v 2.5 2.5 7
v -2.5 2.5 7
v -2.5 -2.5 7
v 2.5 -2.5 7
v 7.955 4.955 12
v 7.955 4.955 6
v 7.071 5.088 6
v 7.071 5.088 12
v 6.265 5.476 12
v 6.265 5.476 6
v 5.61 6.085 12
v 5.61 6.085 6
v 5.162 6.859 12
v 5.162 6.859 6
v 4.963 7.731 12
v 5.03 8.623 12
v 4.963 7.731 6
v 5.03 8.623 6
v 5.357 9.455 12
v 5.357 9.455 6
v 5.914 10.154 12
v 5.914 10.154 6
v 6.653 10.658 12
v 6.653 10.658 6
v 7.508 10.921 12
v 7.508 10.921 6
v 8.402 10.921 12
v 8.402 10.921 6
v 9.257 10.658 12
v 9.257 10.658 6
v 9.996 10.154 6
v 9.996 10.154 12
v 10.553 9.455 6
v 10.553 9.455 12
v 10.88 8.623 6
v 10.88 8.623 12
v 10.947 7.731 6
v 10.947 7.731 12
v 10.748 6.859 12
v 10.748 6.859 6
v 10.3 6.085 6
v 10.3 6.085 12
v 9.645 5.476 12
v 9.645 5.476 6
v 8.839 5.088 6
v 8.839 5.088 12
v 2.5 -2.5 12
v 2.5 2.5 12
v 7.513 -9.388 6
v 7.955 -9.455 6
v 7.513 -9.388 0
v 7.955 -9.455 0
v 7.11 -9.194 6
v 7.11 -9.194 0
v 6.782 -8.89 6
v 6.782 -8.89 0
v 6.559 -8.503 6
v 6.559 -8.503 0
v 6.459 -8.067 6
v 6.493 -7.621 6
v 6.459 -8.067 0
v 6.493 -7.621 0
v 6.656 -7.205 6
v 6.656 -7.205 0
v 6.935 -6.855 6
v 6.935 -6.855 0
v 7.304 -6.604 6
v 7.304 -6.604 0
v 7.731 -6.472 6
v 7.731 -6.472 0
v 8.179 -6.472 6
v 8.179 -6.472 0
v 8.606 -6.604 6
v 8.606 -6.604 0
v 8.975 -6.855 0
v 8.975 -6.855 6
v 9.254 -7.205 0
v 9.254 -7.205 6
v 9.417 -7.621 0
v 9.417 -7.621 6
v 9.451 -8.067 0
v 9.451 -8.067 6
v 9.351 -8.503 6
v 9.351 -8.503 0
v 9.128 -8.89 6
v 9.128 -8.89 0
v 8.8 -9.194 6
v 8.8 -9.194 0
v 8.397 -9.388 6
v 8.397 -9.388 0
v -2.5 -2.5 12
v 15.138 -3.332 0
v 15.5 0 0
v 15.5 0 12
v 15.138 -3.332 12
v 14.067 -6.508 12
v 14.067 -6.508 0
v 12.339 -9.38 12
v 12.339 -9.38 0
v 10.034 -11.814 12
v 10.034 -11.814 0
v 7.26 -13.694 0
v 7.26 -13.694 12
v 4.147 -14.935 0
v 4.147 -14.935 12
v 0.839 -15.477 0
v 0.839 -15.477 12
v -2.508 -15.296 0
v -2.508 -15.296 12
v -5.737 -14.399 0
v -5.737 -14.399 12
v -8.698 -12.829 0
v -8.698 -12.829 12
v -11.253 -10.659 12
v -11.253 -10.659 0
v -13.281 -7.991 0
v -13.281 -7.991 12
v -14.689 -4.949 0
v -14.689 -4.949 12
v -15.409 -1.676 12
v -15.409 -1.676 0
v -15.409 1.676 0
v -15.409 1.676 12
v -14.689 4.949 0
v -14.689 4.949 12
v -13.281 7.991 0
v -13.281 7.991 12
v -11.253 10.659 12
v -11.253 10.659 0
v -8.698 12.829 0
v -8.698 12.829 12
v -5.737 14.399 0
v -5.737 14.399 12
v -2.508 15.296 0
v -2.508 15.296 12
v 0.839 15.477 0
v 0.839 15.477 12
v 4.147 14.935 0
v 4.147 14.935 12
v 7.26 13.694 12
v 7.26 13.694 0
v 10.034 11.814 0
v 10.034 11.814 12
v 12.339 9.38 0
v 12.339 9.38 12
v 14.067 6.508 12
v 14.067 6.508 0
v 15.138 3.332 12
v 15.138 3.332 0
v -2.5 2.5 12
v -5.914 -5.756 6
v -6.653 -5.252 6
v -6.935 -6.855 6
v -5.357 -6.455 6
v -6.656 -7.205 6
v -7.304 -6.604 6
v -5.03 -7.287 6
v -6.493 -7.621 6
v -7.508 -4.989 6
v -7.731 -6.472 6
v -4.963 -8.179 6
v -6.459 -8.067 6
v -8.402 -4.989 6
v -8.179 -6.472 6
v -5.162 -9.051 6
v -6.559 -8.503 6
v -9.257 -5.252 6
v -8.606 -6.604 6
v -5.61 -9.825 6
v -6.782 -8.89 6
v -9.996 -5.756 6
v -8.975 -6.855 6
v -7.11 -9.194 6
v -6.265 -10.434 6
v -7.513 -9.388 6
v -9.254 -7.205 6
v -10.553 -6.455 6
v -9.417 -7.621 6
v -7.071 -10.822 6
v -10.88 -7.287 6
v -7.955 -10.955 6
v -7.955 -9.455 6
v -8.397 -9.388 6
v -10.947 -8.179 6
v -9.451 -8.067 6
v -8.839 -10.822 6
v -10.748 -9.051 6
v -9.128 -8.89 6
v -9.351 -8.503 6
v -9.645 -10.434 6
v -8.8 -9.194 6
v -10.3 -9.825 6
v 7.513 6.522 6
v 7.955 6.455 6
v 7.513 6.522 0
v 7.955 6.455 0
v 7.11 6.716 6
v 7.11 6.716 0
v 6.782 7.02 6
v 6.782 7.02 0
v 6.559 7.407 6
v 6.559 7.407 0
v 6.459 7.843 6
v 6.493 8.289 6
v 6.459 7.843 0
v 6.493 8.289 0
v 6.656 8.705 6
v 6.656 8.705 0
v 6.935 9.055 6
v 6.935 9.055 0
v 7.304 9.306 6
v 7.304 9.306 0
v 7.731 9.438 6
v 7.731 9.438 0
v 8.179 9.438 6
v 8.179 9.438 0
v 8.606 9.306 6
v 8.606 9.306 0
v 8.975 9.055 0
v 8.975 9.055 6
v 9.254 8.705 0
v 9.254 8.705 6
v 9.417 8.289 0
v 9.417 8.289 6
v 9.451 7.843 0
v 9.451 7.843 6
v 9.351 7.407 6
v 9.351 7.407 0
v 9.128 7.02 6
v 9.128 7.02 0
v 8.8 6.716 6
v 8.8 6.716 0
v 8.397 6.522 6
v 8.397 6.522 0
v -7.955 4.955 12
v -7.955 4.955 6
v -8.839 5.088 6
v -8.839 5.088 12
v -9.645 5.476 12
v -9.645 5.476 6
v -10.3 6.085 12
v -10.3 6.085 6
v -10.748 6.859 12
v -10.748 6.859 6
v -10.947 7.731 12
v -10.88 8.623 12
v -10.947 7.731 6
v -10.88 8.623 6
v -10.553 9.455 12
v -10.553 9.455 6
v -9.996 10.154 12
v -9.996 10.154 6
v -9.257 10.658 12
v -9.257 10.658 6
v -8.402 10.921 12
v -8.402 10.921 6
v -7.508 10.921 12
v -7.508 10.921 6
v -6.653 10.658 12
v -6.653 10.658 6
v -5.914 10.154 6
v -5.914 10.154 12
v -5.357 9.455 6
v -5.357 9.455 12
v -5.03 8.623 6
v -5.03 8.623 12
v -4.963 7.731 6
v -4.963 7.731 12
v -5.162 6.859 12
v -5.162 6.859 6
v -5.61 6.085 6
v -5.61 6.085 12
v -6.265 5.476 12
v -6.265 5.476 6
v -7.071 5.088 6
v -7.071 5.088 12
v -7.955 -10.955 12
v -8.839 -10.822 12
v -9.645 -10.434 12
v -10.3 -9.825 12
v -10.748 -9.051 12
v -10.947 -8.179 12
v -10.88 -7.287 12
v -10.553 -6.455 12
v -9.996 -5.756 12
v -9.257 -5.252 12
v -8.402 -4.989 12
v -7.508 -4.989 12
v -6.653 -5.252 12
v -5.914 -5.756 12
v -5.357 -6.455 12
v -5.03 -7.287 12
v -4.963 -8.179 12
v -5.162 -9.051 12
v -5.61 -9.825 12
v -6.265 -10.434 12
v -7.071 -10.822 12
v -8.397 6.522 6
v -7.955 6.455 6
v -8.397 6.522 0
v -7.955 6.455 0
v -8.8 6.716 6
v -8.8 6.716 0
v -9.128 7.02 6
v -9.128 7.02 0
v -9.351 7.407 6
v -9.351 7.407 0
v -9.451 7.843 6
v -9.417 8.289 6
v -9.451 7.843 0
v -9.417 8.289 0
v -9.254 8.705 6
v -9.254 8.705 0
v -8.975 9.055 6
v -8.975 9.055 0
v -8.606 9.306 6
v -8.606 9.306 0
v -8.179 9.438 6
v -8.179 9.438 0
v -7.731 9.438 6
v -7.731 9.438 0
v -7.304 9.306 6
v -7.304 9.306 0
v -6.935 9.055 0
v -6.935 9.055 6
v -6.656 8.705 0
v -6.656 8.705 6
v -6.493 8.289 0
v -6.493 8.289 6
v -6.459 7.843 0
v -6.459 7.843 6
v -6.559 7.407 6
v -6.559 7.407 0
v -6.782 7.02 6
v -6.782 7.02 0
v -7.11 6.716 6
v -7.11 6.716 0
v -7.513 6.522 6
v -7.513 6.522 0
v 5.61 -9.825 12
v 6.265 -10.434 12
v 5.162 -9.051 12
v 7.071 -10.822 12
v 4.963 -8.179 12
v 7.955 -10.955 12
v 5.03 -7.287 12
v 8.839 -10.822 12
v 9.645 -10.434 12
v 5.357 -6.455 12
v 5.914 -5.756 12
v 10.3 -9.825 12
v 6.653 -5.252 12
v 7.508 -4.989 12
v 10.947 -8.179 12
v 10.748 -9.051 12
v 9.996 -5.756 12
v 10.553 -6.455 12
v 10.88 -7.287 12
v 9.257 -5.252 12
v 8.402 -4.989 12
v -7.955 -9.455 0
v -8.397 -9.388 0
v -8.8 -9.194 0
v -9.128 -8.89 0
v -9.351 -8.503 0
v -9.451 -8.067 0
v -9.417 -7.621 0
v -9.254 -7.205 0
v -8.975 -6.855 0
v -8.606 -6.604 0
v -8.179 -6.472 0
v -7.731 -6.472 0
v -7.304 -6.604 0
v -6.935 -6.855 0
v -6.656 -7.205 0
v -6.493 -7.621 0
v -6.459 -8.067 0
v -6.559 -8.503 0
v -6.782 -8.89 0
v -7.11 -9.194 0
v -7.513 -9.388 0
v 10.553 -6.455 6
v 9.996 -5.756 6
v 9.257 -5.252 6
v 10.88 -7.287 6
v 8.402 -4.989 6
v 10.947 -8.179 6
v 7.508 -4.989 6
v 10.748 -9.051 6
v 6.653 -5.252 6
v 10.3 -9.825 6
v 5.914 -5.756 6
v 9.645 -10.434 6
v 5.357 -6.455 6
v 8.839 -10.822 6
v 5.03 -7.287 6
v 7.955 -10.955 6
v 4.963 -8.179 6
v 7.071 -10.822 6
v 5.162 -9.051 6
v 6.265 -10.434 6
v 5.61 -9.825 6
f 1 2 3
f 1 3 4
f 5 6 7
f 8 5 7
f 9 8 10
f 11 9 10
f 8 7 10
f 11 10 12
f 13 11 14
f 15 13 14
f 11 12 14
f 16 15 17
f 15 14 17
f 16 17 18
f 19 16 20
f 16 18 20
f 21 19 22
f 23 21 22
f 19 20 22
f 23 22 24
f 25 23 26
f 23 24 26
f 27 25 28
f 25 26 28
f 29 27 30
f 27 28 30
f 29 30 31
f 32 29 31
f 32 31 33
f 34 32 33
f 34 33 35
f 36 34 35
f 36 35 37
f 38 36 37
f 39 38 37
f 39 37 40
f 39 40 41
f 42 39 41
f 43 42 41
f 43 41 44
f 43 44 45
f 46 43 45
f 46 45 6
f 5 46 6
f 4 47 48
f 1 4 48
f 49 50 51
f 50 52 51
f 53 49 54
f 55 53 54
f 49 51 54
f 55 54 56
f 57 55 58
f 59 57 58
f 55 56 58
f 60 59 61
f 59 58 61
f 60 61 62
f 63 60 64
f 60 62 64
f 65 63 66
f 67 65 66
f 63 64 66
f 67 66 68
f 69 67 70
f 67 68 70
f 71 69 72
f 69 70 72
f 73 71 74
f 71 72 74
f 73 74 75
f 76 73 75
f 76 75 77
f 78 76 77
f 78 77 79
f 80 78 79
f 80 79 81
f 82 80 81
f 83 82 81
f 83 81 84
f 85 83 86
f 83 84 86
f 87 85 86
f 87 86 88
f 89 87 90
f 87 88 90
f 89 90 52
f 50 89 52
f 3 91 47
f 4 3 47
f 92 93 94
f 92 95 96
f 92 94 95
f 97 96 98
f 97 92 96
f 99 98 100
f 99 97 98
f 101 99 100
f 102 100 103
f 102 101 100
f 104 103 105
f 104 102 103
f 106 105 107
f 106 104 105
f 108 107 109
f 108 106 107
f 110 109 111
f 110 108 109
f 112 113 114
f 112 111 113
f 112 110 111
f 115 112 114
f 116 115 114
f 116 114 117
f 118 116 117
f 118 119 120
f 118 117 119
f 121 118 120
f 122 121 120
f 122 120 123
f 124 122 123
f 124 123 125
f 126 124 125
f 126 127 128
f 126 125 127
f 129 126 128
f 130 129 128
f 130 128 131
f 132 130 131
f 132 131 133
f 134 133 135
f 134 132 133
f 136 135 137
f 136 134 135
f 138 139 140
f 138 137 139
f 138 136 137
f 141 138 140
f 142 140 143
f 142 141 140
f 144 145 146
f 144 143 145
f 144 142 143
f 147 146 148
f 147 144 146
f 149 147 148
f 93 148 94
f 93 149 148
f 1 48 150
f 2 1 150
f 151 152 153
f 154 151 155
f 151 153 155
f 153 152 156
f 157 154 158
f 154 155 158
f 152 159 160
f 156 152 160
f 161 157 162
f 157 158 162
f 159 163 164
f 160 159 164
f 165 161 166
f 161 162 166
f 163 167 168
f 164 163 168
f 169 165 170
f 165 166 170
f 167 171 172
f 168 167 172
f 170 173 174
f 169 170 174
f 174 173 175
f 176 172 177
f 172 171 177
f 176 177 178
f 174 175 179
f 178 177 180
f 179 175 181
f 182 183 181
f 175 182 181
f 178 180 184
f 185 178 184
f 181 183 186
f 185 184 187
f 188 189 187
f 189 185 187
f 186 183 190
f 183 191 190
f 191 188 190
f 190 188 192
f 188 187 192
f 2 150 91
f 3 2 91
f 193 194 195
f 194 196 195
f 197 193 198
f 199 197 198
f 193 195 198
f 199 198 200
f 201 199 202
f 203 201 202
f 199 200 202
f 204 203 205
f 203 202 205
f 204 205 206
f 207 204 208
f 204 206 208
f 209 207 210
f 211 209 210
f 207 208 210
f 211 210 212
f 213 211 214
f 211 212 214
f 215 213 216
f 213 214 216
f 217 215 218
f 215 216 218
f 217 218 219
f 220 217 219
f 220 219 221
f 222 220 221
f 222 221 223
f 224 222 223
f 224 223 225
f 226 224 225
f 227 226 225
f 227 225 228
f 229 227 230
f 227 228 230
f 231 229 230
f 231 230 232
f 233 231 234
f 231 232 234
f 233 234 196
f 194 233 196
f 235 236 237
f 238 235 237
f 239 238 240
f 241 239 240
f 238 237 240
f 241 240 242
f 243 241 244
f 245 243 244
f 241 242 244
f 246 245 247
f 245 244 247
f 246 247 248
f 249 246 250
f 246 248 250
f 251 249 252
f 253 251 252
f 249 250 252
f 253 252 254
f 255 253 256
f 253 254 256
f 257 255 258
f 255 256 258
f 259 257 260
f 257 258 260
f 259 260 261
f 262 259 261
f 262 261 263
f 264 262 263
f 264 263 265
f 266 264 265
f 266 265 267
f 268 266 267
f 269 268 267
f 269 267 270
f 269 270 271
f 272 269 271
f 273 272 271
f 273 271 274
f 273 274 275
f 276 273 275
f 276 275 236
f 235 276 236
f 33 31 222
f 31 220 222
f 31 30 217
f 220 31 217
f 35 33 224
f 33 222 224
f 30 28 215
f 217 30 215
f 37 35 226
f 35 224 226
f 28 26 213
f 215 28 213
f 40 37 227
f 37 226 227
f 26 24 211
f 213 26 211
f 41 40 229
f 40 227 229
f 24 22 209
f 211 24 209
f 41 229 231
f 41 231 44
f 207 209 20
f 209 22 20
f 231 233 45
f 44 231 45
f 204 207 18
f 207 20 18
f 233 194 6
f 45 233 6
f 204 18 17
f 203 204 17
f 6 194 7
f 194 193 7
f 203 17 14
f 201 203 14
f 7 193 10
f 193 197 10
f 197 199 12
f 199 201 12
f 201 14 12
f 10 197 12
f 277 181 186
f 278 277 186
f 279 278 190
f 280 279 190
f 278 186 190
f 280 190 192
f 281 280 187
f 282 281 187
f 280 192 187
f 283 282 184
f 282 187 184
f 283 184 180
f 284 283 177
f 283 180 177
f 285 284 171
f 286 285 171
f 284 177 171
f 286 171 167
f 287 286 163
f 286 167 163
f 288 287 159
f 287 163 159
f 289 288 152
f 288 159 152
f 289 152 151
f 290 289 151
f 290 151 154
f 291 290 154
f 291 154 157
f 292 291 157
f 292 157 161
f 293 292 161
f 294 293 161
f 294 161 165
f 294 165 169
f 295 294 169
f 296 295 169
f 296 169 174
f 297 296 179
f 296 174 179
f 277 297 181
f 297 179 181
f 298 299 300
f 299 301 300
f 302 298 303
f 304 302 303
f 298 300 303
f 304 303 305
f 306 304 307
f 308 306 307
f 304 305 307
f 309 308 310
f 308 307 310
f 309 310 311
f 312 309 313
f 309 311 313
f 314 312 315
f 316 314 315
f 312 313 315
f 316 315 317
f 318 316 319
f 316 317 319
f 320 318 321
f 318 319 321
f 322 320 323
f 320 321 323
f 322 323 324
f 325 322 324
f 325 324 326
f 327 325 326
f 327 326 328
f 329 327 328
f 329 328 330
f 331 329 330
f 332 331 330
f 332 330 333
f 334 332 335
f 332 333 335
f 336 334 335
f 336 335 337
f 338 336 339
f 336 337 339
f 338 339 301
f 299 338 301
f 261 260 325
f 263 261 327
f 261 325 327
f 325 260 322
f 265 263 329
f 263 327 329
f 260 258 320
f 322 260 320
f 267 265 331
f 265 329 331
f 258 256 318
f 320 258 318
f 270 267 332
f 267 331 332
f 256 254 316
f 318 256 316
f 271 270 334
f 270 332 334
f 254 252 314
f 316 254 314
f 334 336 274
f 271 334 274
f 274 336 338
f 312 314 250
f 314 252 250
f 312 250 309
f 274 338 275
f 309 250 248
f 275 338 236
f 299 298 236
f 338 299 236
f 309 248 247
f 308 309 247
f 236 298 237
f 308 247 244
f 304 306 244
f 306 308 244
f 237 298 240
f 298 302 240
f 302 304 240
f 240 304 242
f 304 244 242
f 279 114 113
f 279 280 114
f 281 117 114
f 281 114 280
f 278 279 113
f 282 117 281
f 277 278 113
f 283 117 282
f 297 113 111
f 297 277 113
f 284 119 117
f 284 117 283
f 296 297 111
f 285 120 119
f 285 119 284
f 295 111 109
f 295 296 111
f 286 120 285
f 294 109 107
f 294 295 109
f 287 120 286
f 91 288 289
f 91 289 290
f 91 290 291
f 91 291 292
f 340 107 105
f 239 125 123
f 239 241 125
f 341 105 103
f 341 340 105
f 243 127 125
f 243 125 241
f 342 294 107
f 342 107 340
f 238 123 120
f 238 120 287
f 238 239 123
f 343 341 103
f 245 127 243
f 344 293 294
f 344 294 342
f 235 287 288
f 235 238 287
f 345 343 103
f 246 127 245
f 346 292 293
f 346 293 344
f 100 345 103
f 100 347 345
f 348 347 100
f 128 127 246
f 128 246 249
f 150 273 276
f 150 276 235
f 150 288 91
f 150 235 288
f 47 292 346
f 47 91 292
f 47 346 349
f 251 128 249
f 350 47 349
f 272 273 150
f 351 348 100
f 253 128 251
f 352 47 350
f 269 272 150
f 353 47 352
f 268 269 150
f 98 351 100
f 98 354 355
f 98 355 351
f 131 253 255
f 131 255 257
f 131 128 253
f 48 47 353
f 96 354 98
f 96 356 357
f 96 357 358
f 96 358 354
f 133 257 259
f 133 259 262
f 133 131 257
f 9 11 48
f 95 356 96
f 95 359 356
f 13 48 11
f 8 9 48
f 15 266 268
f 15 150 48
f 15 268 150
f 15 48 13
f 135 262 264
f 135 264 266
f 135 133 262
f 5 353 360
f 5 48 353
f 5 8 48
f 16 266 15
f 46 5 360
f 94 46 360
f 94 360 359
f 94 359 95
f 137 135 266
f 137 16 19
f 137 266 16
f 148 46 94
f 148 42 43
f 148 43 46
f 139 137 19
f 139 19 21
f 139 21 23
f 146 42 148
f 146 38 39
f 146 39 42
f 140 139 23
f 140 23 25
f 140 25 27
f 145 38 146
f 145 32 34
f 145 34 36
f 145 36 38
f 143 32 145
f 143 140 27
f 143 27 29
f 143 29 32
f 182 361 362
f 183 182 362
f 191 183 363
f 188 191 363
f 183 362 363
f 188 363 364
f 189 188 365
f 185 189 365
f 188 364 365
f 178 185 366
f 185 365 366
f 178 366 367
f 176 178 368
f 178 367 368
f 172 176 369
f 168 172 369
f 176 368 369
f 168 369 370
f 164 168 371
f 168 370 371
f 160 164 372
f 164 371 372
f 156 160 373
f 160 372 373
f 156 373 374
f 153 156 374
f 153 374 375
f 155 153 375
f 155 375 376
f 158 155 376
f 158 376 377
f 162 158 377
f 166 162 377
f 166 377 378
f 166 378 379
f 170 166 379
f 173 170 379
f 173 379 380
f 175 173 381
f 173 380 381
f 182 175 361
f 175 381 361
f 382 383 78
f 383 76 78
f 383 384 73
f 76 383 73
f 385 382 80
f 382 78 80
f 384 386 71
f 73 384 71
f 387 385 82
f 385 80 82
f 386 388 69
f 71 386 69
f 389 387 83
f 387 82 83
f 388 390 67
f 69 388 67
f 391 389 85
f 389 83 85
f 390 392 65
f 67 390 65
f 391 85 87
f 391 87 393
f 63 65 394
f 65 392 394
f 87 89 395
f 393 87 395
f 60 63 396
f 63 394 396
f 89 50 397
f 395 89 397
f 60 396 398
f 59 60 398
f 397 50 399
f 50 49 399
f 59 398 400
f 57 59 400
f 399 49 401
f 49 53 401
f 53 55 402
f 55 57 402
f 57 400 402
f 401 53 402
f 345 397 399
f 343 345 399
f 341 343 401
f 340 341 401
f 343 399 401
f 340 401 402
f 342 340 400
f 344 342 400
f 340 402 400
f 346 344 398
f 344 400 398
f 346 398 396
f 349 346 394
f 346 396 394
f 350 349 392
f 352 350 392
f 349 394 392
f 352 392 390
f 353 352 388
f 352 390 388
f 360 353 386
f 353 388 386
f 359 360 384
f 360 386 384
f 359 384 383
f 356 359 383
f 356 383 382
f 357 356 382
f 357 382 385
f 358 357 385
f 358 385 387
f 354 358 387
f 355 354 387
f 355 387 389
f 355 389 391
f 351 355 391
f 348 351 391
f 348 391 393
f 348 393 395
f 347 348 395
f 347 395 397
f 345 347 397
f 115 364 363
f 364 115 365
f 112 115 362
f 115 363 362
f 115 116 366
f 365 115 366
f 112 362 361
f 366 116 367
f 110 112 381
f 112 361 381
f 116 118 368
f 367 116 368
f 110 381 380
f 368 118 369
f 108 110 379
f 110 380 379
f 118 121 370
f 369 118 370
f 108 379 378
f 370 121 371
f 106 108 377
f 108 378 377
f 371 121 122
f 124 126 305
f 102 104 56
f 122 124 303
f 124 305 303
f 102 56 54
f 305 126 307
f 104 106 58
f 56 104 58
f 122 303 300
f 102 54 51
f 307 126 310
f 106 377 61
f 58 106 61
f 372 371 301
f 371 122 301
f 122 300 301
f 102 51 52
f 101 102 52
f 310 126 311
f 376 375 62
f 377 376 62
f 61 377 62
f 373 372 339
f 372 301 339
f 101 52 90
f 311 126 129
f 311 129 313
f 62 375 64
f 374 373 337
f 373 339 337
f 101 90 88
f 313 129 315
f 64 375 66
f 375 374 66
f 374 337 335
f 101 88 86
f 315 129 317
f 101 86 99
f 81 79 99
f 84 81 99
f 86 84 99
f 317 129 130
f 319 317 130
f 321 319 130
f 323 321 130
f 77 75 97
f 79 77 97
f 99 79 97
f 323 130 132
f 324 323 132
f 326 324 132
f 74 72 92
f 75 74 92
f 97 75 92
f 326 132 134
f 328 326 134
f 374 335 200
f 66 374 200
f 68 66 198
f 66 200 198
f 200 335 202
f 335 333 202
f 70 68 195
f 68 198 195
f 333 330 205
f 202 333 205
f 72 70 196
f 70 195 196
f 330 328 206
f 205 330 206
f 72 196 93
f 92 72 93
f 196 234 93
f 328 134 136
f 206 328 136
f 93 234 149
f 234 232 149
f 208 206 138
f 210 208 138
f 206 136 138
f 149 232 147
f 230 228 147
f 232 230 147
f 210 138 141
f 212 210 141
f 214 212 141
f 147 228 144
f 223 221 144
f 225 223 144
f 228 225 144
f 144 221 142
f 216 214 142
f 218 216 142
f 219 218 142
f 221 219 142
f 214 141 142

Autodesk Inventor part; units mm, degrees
ref_plane "YZ Plane" through (0, 0, 0) normal (1, 0, 0) x (0, 1, 0)
ref_plane "XZ Plane" through (0, 0, 0) normal (0, 1, 0) x (-1, 0, 0)
ref_plane "XY Plane" through (0, 0, 0) normal (0, 0, 1) x (1, 0, 0)
sketch "Skizze1" plane through (0, 0, 0) normal (0, 0, 1) x (1, 0, 0)
  circle A0 centre (0, 0) radius 15.5
  dimension "d0" = 31
extrude "Extrusion1" add sketch "Skizze1" along normal blind 12
sketch "Skizze2" plane through (0, 0, 12) normal (0, 0, 1) x (1, 0, 0)
  line L0 (-2.5, -2.5) -> (2.5, -2.5)
  line L1 (2.5, -2.5) -> (2.5, 2.5)
  line L2 (2.5, 2.5) -> (-2.5, 2.5)
  line L3 (-2.5, 2.5) -> (-2.5, -2.5)
  line L4 (-2.5, -2.5) -> (2.5, 2.5) construction
  line L5 (2.5, -2.5) -> (-2.5, 2.5) construction
  point P0 (0, 0)
  dimension "d3" = 5
extrude "Extrusion2" cut sketch "Skizze2" against normal blind 5
sketch "Skizze3" plane through (0, 0, 12) normal (0, 0, 1) x (1, 0, 0)
  circle A0 centre (0, 0) radius 11.25
  line L0 (-7.955, -7.955) -> (7.955, -7.955)
  line L1 (7.955, -7.955) -> (7.955, 7.955)
  line L2 (7.955, 7.955) -> (-7.955, 7.955)
  line L3 (-7.955, 7.955) -> (-7.955, -7.955)
  line L4 (-7.955, -7.955) -> (7.955, 7.955) construction
  line L5 (7.955, -7.955) -> (-7.955, 7.955) construction
  dimension "d6" = 22.5
hole "Bohrung1" at (-7.955, -7.955, 12) at (7.955, -7.955, 12) at (7.955, 7.955, 12) at (-7.955, 7.955, 12) direction (0, 0, -1) diameter 3 end through all counterbore diameter 6 counterbore depth 6
properties part number "rotBaseMagnetMountQube"
